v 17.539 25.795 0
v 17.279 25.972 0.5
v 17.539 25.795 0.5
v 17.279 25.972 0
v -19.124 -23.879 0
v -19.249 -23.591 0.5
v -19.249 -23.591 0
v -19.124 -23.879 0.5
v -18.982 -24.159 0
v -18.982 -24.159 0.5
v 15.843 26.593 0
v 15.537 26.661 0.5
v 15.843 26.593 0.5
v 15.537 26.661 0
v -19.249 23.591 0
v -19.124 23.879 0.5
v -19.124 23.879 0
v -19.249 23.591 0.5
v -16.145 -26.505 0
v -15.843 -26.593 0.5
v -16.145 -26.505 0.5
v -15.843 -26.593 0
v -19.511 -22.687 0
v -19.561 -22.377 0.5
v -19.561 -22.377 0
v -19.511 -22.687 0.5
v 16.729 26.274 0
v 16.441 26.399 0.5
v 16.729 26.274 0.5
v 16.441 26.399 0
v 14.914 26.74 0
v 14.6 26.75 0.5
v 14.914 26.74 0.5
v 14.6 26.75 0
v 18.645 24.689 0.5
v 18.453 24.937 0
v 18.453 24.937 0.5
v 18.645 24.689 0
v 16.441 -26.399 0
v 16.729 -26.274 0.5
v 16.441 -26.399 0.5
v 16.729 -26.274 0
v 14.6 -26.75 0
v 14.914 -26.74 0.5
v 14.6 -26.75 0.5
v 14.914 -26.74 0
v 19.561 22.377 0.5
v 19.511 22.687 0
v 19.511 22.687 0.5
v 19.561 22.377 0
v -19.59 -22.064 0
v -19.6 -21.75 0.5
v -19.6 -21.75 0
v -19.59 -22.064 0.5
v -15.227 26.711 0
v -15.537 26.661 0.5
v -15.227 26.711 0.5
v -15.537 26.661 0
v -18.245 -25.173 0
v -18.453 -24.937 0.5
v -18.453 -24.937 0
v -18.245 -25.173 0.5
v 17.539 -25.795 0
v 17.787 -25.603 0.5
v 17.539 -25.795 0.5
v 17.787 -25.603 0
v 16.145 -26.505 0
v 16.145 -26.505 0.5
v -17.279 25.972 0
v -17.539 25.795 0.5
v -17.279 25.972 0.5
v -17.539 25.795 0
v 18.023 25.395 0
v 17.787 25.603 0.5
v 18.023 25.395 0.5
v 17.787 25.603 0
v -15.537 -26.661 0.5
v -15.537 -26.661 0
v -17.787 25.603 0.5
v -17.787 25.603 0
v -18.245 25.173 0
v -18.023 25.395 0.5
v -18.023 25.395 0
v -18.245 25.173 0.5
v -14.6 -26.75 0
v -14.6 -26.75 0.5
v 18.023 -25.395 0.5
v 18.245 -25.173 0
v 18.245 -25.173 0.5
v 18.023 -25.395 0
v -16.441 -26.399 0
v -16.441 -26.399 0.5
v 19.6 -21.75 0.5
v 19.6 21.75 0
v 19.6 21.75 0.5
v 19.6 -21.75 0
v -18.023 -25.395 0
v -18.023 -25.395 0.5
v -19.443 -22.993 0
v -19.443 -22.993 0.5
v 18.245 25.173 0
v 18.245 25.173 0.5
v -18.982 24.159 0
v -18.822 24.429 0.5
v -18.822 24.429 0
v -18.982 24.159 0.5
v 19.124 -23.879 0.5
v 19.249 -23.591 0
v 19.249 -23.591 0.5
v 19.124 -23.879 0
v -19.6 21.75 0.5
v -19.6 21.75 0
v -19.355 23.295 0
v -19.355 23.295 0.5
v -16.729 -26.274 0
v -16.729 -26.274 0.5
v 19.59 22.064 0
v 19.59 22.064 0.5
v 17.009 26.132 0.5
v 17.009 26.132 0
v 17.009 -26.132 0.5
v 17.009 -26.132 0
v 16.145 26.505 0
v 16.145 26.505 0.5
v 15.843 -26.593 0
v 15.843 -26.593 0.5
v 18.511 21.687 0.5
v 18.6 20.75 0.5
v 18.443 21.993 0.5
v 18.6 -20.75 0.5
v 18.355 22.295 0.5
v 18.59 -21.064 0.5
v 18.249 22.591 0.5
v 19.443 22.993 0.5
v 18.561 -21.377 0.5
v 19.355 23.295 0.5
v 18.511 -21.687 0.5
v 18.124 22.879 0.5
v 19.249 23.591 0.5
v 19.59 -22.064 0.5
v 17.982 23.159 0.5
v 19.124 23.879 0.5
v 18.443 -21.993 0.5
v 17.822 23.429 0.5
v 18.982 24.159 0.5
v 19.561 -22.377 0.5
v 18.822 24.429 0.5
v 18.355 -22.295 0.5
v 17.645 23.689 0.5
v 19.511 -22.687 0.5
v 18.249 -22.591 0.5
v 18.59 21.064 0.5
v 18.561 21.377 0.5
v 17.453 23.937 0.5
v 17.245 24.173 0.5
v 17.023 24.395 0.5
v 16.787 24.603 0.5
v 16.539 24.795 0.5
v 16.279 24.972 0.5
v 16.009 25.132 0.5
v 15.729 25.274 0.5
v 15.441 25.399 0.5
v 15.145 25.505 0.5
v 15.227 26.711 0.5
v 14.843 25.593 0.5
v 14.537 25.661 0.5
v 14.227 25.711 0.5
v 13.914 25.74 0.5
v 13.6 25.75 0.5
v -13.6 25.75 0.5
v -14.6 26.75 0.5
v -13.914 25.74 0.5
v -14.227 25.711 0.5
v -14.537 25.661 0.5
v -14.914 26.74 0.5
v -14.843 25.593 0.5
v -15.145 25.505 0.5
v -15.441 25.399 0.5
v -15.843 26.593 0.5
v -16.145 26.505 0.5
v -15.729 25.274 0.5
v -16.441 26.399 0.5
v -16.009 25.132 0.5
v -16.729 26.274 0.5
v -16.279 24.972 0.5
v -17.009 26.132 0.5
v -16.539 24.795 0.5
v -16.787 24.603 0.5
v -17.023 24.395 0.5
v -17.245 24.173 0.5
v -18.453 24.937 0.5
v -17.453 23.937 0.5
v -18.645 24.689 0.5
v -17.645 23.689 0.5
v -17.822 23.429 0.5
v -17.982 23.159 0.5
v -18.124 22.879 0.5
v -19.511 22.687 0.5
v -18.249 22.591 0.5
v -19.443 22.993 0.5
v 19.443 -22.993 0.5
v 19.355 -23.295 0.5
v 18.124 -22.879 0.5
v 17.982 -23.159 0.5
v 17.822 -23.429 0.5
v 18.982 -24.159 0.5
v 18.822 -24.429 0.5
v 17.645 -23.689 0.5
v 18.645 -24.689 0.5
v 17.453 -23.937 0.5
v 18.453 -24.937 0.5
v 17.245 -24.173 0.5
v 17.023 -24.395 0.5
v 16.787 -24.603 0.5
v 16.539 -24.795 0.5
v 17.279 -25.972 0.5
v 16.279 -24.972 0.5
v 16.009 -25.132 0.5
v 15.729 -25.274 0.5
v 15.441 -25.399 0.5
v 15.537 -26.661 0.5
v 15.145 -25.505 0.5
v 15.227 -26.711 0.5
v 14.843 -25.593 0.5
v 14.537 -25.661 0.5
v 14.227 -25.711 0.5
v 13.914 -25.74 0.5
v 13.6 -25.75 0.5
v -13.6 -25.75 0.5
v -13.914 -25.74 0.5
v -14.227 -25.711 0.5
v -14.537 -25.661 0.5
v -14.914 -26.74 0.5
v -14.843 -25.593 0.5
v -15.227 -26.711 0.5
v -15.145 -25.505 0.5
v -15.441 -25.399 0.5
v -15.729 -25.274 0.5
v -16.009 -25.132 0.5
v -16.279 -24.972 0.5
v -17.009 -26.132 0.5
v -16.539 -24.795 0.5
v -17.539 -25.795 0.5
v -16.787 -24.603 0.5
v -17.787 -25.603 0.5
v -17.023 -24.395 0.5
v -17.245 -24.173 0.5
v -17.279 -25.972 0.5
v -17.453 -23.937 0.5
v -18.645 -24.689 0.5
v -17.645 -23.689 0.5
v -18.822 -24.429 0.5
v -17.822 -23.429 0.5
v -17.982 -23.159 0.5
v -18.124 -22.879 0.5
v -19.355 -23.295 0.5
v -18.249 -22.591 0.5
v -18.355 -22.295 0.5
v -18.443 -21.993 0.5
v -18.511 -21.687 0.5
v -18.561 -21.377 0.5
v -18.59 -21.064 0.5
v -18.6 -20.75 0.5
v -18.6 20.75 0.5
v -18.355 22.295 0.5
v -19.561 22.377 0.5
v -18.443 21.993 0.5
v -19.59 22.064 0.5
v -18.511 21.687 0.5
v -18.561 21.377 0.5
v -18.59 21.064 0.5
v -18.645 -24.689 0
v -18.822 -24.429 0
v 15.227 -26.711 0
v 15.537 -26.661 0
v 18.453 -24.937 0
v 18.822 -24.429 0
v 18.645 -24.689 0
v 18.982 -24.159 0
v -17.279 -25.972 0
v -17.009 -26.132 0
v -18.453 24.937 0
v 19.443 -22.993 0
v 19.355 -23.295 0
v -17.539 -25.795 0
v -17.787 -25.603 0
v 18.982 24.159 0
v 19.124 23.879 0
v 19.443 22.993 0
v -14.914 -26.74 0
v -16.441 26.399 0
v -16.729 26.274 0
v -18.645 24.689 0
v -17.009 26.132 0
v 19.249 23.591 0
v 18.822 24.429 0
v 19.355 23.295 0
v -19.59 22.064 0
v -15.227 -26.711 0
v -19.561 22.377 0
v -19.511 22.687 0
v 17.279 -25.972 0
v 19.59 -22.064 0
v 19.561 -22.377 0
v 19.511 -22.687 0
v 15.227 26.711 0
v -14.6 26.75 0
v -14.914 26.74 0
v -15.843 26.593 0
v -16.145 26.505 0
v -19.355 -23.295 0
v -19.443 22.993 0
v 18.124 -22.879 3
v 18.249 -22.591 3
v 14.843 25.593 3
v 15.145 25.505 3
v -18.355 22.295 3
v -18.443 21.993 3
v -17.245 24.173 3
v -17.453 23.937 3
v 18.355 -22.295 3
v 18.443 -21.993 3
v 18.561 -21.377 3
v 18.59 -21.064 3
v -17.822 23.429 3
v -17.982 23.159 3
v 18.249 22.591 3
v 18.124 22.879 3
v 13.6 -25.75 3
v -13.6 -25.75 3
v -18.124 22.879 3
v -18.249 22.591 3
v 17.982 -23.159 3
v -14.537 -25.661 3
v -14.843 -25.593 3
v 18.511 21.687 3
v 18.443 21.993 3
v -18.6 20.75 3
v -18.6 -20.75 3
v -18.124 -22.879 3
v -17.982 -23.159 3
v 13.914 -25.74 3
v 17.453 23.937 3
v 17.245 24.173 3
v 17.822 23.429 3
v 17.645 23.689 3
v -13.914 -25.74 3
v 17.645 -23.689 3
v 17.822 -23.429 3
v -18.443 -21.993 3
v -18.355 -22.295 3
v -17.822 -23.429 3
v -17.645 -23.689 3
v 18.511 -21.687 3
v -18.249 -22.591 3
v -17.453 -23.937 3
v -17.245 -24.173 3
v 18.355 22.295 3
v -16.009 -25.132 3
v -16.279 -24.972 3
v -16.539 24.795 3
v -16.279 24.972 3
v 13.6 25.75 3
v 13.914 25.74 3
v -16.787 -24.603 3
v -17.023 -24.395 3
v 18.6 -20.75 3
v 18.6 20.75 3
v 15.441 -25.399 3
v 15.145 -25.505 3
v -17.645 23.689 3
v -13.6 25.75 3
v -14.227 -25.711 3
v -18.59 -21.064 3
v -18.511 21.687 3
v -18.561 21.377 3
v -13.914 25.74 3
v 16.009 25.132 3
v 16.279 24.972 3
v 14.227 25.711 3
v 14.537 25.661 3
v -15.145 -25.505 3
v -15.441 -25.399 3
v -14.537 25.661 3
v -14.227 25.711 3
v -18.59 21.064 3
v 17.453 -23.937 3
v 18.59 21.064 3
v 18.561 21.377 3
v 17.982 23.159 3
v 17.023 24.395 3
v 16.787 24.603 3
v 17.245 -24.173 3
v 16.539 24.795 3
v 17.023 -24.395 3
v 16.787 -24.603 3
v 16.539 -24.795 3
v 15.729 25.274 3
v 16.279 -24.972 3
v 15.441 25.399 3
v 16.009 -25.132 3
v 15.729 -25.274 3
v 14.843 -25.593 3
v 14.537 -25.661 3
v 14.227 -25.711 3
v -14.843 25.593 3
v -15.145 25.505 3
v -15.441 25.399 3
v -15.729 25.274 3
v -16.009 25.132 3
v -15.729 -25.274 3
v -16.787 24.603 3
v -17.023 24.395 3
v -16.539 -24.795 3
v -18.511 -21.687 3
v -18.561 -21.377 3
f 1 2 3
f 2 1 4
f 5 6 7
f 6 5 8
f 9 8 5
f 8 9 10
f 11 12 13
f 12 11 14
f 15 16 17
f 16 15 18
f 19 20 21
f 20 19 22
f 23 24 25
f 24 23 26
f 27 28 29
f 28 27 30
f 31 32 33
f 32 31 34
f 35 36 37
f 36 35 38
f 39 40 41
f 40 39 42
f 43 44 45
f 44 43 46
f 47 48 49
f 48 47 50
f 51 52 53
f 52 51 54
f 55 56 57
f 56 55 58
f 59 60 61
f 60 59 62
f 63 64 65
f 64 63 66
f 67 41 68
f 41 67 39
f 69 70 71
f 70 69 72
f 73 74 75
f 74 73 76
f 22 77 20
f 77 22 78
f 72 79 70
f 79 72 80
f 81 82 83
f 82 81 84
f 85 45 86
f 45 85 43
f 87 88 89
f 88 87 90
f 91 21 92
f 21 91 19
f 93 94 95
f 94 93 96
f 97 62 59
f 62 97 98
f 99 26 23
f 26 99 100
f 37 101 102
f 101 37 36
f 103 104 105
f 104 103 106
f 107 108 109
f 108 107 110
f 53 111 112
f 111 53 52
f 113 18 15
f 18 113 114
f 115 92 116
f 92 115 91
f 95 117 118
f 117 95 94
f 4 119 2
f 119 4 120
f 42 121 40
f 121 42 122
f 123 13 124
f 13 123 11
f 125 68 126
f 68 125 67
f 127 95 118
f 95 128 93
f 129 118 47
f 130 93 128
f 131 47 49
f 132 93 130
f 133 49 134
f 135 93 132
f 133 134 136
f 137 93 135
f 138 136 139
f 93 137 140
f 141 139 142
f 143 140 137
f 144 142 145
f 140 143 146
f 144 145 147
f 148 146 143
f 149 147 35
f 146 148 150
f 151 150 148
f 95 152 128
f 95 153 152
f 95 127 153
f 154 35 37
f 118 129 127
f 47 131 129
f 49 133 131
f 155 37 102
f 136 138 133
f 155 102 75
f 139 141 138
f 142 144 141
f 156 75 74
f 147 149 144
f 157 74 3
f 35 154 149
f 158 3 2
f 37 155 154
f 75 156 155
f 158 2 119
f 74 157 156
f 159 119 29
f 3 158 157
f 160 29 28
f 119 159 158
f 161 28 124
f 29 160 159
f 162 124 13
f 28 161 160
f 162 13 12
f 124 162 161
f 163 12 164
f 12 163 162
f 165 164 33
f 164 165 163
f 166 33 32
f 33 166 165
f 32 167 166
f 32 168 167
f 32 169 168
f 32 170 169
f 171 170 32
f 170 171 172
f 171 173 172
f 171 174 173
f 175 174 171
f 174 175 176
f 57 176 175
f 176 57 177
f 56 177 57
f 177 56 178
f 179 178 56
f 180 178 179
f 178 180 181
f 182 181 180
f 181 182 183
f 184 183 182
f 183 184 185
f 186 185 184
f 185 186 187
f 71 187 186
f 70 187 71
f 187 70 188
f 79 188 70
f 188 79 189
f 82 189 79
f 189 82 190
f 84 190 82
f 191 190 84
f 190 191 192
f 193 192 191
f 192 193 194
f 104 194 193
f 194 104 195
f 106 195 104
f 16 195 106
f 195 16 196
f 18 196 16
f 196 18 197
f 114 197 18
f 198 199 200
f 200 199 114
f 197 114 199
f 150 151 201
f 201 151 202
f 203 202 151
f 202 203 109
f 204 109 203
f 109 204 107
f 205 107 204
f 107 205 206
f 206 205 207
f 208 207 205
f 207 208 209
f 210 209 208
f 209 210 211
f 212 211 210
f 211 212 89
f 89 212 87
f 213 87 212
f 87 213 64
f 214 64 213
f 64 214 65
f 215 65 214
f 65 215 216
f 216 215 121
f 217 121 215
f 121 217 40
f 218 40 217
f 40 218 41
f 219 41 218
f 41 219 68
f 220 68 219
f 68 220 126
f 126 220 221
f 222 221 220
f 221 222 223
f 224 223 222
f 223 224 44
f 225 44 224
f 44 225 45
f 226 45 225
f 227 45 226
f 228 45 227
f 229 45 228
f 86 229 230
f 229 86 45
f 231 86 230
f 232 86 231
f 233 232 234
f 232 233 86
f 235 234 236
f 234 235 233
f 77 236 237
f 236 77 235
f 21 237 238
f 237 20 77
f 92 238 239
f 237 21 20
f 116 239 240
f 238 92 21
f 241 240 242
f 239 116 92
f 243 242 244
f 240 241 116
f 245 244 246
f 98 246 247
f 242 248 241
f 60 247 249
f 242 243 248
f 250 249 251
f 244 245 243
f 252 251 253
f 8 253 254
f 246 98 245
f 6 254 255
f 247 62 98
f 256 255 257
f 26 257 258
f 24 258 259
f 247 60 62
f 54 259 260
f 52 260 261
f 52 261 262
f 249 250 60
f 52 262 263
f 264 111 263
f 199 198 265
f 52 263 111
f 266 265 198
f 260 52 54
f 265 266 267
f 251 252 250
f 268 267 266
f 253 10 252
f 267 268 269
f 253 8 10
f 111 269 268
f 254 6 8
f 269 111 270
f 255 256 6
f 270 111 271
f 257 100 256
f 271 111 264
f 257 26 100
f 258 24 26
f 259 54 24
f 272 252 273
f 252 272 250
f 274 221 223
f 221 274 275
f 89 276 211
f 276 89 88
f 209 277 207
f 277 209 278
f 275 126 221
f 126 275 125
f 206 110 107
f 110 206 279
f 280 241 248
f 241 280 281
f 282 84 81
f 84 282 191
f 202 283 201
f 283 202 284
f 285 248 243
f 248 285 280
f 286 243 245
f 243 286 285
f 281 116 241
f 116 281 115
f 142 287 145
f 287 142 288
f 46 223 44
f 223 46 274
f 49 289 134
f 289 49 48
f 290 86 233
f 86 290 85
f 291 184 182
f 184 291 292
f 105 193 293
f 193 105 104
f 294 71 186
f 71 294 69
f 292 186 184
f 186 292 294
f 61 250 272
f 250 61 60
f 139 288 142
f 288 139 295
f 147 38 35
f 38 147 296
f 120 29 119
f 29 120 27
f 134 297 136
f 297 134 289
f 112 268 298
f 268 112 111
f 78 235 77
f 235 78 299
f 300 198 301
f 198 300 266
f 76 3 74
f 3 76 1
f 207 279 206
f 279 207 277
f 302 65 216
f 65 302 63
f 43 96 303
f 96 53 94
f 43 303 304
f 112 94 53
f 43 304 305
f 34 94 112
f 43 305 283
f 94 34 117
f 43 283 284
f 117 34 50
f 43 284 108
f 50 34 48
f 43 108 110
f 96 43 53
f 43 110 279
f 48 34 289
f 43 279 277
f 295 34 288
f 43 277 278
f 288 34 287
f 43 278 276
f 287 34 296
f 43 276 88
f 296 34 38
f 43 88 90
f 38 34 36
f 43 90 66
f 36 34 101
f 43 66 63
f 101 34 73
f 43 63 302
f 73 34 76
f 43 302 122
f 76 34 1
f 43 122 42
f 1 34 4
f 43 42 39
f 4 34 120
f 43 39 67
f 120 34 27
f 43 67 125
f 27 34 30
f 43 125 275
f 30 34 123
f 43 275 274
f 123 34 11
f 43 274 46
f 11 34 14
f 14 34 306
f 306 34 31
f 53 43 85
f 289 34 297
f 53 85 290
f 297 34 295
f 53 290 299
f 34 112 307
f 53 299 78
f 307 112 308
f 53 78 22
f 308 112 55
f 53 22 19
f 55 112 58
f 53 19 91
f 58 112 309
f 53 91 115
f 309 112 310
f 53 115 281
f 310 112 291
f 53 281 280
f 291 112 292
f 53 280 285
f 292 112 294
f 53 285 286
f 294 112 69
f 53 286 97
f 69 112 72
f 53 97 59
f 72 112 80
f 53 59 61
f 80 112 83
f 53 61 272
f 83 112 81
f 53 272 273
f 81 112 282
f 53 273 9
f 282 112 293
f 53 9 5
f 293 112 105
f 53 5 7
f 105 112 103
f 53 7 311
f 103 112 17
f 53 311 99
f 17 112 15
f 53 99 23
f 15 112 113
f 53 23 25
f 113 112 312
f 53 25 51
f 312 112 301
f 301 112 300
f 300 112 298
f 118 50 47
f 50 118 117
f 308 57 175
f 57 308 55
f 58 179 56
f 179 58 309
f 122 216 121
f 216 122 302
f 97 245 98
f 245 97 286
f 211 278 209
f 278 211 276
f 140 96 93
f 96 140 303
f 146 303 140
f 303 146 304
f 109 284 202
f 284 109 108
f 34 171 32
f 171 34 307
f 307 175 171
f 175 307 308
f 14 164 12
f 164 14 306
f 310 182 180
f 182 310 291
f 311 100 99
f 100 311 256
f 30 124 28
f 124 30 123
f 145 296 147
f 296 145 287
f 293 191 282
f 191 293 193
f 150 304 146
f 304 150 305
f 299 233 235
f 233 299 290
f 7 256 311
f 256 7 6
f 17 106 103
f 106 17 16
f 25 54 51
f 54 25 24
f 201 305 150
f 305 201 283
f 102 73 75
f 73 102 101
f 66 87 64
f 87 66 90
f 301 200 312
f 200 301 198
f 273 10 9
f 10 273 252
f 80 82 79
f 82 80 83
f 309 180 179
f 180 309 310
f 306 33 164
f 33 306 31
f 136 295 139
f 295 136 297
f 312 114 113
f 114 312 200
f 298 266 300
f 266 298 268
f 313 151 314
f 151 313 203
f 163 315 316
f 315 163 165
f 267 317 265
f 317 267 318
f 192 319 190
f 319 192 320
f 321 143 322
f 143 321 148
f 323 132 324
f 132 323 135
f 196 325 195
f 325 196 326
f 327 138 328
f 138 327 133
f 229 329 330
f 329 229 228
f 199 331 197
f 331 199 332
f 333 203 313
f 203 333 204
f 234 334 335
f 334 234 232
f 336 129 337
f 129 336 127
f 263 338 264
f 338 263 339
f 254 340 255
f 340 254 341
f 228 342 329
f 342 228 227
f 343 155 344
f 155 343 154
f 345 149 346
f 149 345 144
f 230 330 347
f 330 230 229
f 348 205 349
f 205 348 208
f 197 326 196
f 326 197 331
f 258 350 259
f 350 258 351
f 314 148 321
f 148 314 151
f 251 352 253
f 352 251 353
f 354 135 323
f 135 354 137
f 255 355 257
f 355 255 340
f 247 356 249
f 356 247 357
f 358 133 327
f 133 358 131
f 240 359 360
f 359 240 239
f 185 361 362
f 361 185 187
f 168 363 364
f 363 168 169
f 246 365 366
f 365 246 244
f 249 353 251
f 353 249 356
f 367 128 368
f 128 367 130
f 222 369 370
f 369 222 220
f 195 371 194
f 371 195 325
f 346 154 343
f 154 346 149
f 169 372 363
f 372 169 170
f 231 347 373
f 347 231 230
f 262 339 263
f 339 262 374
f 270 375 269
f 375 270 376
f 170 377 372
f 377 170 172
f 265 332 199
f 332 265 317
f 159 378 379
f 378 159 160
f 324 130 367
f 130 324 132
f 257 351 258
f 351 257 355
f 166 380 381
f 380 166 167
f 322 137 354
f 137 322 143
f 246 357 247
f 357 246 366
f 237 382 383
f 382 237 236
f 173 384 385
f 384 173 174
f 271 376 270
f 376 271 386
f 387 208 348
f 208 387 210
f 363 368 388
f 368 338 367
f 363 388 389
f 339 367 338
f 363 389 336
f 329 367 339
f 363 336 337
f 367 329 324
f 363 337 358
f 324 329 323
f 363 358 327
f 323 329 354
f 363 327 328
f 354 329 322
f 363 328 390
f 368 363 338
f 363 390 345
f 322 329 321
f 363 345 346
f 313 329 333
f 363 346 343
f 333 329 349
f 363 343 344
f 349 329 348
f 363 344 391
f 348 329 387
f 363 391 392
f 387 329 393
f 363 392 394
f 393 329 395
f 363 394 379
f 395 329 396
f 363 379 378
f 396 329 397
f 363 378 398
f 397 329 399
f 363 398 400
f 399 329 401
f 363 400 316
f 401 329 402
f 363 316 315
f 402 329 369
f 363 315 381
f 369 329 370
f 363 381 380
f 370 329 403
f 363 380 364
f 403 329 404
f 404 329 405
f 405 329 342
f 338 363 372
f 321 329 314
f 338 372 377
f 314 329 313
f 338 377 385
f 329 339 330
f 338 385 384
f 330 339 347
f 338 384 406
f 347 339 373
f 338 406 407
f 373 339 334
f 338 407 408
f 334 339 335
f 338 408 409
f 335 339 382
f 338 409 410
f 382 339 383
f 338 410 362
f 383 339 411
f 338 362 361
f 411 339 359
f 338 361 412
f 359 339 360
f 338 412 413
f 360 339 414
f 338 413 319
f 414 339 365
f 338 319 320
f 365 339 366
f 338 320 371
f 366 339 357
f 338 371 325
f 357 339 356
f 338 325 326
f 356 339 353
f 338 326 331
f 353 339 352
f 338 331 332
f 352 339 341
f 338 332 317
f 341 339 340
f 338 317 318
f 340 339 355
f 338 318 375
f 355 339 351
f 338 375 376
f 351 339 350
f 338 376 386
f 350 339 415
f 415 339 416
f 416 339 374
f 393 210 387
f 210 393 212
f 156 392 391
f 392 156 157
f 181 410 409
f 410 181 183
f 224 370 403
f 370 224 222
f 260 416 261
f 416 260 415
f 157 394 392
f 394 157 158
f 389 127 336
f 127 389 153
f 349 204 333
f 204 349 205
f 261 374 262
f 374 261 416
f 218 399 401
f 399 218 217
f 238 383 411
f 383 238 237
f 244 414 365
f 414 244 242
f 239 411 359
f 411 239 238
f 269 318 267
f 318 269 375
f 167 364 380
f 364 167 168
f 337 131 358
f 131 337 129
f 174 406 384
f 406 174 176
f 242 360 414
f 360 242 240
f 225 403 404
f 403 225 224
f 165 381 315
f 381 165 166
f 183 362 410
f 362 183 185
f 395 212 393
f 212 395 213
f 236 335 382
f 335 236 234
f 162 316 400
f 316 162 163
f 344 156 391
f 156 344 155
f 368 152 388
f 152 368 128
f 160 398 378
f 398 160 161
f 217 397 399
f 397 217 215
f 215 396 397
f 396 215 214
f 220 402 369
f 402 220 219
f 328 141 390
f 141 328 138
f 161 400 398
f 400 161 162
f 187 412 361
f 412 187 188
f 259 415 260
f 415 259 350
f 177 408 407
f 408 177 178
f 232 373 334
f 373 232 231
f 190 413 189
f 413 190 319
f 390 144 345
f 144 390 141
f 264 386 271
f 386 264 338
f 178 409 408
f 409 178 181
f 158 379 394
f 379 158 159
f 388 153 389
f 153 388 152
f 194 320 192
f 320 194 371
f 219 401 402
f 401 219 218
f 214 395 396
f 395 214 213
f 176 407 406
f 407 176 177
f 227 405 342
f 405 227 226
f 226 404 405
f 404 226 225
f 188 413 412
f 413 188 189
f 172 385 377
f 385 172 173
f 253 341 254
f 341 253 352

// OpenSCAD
// Mac Pro 5.1 drive bay cover
//*
CORNER_DIA = 10;
WIDTH = 37.2;
LENGTH = 51.5;
THICKNESS = 3;
LIP_WIDTH = 1;
LIP_THICKNESS = 0.5;
/**/

// Mac Pro 5.1 CD flap cover
/*
CORNER_DIA = 6;
WIDTH = 17.1;
LENGTH = 162.5;
THICKNESS = 3;
LIP_WIDTH = 1;
LIP_THICKNESS = 1.5;
/**/

$fn = 100;

module rounded_rect(width, length, height, corner_dia) {
  hull() {
    for(i = [-1, 1]) {
      for(j = [-1, 1]) {
        translate([i * (width - corner_dia)/2, j * (length - corner_dia)/2])
        cylinder(d = corner_dia, h = height);
      }
    }
  }
}

rounded_rect(WIDTH + LIP_WIDTH * 2, LENGTH + LIP_WIDTH * 2, LIP_THICKNESS, CORNER_DIA);
rounded_rect(WIDTH, LENGTH, THICKNESS, CORNER_DIA);
